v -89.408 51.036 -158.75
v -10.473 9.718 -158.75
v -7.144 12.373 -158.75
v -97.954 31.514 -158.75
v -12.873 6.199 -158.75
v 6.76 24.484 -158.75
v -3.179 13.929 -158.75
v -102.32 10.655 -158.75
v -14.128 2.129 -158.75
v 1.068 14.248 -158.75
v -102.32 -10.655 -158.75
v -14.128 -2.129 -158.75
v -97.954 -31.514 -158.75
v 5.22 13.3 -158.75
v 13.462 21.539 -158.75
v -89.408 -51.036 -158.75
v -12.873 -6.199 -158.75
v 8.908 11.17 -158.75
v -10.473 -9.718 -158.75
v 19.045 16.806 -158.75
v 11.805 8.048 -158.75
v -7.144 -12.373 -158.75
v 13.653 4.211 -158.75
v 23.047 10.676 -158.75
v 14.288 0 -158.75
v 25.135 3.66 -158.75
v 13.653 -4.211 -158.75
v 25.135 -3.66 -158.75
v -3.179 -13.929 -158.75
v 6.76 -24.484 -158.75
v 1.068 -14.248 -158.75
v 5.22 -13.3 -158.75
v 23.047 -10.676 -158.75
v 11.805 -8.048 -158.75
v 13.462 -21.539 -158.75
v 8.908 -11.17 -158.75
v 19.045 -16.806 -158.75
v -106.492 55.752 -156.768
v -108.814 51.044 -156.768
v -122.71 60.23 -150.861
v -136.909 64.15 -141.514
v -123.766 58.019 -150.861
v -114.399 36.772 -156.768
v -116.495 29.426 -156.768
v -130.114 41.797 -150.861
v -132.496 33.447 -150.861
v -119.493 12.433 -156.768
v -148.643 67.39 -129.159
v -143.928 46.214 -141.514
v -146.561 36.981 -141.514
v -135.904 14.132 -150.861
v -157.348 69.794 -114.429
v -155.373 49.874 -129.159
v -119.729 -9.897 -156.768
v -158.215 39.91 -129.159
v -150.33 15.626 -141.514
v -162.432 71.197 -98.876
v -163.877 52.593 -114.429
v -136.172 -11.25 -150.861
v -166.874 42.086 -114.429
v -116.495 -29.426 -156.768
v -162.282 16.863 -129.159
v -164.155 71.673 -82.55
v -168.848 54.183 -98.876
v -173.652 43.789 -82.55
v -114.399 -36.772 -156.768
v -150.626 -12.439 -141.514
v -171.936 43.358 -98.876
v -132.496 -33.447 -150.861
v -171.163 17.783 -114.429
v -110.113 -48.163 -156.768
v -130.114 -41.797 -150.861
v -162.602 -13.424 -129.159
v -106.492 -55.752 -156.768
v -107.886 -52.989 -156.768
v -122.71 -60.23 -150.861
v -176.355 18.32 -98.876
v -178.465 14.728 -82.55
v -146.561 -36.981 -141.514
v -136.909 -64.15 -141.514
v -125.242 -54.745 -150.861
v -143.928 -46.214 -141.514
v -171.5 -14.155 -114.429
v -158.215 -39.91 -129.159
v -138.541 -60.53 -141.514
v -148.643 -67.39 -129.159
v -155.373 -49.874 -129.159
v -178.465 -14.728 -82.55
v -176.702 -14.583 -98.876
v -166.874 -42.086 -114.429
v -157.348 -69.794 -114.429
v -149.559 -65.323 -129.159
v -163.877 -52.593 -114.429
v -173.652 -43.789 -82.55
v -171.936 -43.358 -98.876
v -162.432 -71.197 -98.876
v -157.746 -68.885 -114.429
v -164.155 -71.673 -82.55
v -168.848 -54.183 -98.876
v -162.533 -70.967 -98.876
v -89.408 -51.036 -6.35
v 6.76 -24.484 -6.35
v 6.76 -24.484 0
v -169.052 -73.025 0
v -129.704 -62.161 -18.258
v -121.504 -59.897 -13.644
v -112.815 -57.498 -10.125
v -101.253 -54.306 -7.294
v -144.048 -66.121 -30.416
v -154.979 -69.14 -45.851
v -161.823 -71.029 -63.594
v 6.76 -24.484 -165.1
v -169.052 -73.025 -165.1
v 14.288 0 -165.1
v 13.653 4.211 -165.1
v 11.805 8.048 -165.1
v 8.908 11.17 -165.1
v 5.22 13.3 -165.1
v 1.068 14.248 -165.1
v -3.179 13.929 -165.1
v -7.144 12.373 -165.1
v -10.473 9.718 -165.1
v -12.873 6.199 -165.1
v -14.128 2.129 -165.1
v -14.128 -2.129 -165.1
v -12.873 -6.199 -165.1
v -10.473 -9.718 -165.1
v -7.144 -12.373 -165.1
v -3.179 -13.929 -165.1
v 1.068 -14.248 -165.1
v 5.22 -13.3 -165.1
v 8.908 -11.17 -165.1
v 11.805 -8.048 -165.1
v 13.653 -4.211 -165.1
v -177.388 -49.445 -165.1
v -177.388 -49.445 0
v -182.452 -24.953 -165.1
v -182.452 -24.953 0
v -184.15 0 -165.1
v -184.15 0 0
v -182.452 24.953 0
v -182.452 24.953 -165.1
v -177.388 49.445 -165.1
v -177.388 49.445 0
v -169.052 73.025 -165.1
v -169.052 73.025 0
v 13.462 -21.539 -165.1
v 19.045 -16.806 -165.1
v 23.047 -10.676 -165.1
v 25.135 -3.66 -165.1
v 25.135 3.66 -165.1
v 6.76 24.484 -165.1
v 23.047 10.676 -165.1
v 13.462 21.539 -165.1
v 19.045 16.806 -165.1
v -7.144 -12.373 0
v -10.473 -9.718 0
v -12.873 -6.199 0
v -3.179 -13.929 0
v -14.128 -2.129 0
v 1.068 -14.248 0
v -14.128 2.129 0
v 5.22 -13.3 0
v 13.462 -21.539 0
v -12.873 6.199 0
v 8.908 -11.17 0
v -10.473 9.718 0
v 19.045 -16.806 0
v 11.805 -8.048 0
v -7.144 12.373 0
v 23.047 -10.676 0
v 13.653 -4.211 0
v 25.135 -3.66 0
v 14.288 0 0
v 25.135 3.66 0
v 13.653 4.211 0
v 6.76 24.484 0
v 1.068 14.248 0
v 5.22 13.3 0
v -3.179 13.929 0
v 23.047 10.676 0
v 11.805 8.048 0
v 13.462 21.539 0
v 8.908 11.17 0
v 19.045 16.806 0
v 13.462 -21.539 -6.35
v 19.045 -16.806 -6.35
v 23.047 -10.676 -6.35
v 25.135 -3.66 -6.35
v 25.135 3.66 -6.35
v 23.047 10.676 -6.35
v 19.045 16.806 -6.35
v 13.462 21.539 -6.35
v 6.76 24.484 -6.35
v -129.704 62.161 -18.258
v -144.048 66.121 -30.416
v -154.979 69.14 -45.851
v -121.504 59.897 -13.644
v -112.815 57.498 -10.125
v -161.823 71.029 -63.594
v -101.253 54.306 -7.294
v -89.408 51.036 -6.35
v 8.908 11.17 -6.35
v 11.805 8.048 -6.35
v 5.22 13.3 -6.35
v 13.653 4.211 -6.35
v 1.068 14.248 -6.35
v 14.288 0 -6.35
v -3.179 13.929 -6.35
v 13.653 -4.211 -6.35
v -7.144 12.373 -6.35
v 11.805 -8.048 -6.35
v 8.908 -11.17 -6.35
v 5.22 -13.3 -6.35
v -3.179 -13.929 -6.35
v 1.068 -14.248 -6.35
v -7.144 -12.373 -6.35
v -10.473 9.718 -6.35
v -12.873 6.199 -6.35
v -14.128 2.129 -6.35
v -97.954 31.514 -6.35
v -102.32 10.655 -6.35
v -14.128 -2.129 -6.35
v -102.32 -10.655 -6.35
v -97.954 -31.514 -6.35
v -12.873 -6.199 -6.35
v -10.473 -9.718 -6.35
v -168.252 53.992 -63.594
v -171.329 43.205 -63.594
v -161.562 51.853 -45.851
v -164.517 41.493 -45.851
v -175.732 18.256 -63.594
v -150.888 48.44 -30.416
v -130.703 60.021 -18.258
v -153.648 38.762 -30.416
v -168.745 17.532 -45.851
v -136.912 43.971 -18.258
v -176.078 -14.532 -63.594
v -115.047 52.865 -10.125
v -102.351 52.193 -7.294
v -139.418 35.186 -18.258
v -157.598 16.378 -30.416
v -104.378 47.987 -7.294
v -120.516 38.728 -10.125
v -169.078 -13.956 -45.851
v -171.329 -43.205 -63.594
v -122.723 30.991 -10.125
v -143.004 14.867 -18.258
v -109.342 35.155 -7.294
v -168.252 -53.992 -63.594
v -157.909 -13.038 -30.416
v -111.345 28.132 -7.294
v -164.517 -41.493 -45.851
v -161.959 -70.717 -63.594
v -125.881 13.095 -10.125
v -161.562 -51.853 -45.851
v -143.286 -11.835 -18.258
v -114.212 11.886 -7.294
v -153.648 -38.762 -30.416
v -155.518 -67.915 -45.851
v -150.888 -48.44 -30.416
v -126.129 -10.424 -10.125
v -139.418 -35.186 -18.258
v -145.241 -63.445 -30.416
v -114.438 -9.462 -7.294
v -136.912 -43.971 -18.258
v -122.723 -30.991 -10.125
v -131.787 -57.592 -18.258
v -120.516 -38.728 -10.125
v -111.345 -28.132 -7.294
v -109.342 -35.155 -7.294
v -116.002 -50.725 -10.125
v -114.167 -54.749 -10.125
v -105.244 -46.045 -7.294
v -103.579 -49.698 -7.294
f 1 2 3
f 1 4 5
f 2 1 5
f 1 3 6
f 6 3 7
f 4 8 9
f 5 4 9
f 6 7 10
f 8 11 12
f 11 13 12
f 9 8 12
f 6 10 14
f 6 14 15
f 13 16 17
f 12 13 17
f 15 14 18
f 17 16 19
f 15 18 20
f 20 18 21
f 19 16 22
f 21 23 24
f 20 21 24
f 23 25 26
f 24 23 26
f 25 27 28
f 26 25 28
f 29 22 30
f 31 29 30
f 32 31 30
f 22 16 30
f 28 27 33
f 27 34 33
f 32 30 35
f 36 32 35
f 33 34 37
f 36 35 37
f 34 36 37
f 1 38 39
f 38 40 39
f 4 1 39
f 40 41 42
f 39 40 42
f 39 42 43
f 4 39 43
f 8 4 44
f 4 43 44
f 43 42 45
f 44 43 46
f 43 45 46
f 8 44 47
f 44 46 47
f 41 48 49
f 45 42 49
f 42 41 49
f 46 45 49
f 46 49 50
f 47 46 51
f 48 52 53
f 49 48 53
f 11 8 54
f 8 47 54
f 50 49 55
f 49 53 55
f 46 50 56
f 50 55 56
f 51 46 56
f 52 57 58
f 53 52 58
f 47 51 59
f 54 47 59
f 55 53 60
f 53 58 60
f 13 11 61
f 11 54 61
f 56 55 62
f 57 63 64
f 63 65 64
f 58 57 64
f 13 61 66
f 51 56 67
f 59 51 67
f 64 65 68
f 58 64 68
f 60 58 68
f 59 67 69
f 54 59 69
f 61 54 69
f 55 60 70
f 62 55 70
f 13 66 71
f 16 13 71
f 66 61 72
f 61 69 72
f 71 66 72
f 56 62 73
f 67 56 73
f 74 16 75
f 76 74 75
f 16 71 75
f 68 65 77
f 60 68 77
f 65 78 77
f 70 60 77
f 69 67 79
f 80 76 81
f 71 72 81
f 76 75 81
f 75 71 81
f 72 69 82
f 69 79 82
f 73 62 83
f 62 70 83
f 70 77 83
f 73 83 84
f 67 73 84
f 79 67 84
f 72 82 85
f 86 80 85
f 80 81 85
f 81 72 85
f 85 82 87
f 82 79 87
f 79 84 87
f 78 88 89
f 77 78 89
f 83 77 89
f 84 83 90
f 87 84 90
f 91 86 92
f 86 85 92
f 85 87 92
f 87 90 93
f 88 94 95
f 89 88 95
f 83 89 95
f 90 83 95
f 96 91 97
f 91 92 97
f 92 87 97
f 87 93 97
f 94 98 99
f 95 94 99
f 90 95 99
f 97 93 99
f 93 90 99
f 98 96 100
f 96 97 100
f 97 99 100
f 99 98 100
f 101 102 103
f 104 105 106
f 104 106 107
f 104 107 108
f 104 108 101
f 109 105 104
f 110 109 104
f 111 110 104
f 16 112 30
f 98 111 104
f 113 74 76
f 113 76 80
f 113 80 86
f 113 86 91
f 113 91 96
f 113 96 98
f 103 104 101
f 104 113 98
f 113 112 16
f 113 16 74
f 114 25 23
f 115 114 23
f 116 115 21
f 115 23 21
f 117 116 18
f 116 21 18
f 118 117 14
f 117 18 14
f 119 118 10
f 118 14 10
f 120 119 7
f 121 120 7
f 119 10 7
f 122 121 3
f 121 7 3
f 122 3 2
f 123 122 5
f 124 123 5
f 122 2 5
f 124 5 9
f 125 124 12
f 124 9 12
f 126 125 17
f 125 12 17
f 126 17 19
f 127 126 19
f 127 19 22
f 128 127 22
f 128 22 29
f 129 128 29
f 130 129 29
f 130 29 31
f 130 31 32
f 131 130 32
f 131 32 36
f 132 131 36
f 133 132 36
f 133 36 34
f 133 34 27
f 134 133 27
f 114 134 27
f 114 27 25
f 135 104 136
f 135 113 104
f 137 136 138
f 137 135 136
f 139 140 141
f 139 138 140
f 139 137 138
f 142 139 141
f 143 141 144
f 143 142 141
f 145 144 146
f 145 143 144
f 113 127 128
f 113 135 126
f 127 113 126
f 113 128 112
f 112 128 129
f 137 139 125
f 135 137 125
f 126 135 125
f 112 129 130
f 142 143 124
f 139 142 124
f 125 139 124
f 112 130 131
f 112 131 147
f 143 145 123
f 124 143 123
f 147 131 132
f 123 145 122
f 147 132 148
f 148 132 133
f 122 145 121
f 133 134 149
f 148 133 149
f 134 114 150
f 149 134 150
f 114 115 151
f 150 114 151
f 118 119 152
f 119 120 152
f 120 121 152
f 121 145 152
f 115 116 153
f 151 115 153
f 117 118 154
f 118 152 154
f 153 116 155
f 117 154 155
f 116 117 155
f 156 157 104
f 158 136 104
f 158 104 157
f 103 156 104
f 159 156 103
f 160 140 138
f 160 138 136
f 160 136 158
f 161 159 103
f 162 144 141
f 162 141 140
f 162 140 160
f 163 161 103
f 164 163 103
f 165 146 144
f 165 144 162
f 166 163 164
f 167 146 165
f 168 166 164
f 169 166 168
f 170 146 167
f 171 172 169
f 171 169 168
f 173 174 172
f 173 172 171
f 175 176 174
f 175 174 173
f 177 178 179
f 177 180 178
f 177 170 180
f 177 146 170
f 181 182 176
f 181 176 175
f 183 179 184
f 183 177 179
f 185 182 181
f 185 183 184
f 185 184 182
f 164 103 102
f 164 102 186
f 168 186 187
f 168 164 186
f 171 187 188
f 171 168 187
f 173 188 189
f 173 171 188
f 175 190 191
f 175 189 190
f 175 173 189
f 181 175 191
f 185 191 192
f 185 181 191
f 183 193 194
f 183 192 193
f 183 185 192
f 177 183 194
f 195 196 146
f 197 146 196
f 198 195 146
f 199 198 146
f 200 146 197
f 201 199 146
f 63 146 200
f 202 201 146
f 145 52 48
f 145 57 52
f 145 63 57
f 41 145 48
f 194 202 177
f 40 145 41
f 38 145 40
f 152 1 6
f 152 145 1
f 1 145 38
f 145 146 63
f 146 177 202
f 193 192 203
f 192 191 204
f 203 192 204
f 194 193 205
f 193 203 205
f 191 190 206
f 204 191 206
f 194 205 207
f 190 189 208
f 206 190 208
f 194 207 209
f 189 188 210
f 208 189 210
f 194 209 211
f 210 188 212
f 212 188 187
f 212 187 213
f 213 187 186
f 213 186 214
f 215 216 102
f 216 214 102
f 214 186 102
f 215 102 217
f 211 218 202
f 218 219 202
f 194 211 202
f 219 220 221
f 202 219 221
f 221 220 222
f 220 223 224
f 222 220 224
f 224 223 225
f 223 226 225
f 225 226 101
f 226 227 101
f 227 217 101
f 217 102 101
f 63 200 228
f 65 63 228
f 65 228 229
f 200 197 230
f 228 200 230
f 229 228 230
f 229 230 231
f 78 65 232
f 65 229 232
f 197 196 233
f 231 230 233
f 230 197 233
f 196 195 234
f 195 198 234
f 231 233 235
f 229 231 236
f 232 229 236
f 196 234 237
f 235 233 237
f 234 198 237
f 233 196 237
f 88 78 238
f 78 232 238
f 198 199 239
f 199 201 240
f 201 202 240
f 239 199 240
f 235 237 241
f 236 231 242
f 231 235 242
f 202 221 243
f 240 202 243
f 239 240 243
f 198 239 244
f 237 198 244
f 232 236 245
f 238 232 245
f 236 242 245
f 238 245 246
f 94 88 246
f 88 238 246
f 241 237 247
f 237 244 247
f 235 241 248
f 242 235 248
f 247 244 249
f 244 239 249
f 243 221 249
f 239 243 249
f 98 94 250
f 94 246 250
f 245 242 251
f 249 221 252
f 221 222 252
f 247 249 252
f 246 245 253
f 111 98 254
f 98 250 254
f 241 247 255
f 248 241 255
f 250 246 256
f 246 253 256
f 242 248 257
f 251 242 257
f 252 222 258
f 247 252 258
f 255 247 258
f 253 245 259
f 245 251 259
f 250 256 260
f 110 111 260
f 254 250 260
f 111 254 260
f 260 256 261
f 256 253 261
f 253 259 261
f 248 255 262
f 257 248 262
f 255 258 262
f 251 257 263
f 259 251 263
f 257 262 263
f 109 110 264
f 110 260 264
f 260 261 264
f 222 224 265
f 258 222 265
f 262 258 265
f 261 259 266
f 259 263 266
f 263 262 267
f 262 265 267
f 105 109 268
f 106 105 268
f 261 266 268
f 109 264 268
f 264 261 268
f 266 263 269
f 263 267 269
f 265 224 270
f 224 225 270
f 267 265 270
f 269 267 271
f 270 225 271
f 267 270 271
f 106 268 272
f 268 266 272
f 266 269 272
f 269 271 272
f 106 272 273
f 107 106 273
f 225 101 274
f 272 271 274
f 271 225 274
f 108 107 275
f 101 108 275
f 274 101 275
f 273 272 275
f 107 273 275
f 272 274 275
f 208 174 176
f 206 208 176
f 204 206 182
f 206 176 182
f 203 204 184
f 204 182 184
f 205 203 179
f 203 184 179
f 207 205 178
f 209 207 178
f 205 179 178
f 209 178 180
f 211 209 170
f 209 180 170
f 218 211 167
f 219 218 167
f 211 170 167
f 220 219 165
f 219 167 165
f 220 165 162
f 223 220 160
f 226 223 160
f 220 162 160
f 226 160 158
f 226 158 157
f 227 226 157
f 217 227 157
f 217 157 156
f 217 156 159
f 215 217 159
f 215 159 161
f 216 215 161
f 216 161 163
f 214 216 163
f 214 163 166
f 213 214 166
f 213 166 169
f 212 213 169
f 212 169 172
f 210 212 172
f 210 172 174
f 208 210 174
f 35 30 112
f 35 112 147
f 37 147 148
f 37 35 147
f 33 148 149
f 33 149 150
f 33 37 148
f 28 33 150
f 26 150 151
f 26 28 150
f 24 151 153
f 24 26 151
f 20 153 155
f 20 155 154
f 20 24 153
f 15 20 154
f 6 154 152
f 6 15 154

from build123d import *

# Parameters (mm, degrees)
SKETCH1_R               = 14.287500000000001
BOSS_EXTRUDE1_DEPTH     = 165.1
CUT_EXTRUDE1_DEPTH      = 258.8795903614708
CUT_EXTRUDE1_DEPTH_BACK = 258.8795903614708
BOSS_EXTRUDE2_DEPTH     = 152.4
FILLET2_R               = 76.2


with BuildPart() as part:
    # Sketch1 → Boss-Extrude1 (new body)
    with BuildSketch(Plane.XY):
        with BuildLine():
            Line((6.759931115856893, 24.483940273347972), (-169.05197980207154, 73.02499999999999))
            ThreePointArc((-169.05197980207154, 73.02499999999999), (-184.15, 2.255e-14), (-169.05197980207154, -73.02499999999999))
            Line((-169.05197980207154, -73.02499999999999), (6.759931115856893, -24.483940273347972))
            ThreePointArc((6.759931115856893, -24.483940273347972), (25.40000000000002, 0), (6.759931115856893, 24.483940273347972))
        make_face()
        Circle(SKETCH1_R, mode=Mode.SUBTRACT)
    extrude(amount=-BOSS_EXTRUDE1_DEPTH)

    # Sketch2 → Cut-Extrude1 (cut, two sides: drawn at the far end of the back side and taken through both)
    with BuildSketch(Plane(origin=(0, 0, 0), x_dir=(1, 0, 0), z_dir=(0, 1, 0)).offset(-CUT_EXTRUDE1_DEPTH_BACK)):
        Polygon((-184.15, 158.75), (25.400000000000006, 158.75), (25.39999999999999, 6.35), (-184.14999999999998, 6.349999999999994), align=None)
    extrude(amount=CUT_EXTRUDE1_DEPTH + CUT_EXTRUDE1_DEPTH_BACK, mode=Mode.SUBTRACT)


with BuildPart() as cut_extrude1_piece_1:
    # of the separate pieces the step leaves, piece 1, a body of its own (cut_extrude1_pieces)
    add(part.part.solids().sort_by_distance((-169.051979802, -73.025, 0))[0])



with BuildPart() as cut_extrude1_piece_2:
    # of the separate pieces the step leaves, piece 2, a body of its own (cut_extrude1_pieces)
    add(part.part.solids().sort_by_distance((-169.051979802, -73.025, -158.75))[0])


with BuildPart() as cut_extrude1_piece_1_1:
    add(cut_extrude1_piece_1.part)

    add(cut_extrude1_piece_2.part)  # Boss-Extrude2 merges Cut-Extrude1 piece 2
    # Sketch3 → Boss-Extrude2 (add)
    with BuildSketch(Plane.XY.offset(-158.75)):
        with BuildLine():
            Line((-169.05197980207154, 73.02499999999999), (-164.155191747402, 71.67301377682864))
            ThreePointArc((-164.155191747402, 71.67301377682864), (-179.07, 3.242e-14), (-164.15519174740194, -71.67301377682858))
            Line((-164.15519174740194, -71.67301377682858), (-169.05197980207154, -73.02499999999998))
            ThreePointArc((-169.05197980207154, -73.02499999999998), (-184.15, 1.0433e-13), (-169.05197980207154, 73.02499999999999))
        make_face()
    extrude(amount=BOSS_EXTRUDE2_DEPTH)

    # Fillet2
    fillet2_edges = [cut_extrude1_piece_1_1.edges().sort_by_distance(p)[0] for p in [
        (-179.06999999999994, 1.066e-14, -6.349999999999994),
        (-179.06999999999994, 1.066e-14, -158.75),
    ]]
    fillet(fillet2_edges, radius=FILLET2_R - 0.0001)  # a hair under: the kernel refuses the full size


solid = cut_extrude1_piece_1_1.part
